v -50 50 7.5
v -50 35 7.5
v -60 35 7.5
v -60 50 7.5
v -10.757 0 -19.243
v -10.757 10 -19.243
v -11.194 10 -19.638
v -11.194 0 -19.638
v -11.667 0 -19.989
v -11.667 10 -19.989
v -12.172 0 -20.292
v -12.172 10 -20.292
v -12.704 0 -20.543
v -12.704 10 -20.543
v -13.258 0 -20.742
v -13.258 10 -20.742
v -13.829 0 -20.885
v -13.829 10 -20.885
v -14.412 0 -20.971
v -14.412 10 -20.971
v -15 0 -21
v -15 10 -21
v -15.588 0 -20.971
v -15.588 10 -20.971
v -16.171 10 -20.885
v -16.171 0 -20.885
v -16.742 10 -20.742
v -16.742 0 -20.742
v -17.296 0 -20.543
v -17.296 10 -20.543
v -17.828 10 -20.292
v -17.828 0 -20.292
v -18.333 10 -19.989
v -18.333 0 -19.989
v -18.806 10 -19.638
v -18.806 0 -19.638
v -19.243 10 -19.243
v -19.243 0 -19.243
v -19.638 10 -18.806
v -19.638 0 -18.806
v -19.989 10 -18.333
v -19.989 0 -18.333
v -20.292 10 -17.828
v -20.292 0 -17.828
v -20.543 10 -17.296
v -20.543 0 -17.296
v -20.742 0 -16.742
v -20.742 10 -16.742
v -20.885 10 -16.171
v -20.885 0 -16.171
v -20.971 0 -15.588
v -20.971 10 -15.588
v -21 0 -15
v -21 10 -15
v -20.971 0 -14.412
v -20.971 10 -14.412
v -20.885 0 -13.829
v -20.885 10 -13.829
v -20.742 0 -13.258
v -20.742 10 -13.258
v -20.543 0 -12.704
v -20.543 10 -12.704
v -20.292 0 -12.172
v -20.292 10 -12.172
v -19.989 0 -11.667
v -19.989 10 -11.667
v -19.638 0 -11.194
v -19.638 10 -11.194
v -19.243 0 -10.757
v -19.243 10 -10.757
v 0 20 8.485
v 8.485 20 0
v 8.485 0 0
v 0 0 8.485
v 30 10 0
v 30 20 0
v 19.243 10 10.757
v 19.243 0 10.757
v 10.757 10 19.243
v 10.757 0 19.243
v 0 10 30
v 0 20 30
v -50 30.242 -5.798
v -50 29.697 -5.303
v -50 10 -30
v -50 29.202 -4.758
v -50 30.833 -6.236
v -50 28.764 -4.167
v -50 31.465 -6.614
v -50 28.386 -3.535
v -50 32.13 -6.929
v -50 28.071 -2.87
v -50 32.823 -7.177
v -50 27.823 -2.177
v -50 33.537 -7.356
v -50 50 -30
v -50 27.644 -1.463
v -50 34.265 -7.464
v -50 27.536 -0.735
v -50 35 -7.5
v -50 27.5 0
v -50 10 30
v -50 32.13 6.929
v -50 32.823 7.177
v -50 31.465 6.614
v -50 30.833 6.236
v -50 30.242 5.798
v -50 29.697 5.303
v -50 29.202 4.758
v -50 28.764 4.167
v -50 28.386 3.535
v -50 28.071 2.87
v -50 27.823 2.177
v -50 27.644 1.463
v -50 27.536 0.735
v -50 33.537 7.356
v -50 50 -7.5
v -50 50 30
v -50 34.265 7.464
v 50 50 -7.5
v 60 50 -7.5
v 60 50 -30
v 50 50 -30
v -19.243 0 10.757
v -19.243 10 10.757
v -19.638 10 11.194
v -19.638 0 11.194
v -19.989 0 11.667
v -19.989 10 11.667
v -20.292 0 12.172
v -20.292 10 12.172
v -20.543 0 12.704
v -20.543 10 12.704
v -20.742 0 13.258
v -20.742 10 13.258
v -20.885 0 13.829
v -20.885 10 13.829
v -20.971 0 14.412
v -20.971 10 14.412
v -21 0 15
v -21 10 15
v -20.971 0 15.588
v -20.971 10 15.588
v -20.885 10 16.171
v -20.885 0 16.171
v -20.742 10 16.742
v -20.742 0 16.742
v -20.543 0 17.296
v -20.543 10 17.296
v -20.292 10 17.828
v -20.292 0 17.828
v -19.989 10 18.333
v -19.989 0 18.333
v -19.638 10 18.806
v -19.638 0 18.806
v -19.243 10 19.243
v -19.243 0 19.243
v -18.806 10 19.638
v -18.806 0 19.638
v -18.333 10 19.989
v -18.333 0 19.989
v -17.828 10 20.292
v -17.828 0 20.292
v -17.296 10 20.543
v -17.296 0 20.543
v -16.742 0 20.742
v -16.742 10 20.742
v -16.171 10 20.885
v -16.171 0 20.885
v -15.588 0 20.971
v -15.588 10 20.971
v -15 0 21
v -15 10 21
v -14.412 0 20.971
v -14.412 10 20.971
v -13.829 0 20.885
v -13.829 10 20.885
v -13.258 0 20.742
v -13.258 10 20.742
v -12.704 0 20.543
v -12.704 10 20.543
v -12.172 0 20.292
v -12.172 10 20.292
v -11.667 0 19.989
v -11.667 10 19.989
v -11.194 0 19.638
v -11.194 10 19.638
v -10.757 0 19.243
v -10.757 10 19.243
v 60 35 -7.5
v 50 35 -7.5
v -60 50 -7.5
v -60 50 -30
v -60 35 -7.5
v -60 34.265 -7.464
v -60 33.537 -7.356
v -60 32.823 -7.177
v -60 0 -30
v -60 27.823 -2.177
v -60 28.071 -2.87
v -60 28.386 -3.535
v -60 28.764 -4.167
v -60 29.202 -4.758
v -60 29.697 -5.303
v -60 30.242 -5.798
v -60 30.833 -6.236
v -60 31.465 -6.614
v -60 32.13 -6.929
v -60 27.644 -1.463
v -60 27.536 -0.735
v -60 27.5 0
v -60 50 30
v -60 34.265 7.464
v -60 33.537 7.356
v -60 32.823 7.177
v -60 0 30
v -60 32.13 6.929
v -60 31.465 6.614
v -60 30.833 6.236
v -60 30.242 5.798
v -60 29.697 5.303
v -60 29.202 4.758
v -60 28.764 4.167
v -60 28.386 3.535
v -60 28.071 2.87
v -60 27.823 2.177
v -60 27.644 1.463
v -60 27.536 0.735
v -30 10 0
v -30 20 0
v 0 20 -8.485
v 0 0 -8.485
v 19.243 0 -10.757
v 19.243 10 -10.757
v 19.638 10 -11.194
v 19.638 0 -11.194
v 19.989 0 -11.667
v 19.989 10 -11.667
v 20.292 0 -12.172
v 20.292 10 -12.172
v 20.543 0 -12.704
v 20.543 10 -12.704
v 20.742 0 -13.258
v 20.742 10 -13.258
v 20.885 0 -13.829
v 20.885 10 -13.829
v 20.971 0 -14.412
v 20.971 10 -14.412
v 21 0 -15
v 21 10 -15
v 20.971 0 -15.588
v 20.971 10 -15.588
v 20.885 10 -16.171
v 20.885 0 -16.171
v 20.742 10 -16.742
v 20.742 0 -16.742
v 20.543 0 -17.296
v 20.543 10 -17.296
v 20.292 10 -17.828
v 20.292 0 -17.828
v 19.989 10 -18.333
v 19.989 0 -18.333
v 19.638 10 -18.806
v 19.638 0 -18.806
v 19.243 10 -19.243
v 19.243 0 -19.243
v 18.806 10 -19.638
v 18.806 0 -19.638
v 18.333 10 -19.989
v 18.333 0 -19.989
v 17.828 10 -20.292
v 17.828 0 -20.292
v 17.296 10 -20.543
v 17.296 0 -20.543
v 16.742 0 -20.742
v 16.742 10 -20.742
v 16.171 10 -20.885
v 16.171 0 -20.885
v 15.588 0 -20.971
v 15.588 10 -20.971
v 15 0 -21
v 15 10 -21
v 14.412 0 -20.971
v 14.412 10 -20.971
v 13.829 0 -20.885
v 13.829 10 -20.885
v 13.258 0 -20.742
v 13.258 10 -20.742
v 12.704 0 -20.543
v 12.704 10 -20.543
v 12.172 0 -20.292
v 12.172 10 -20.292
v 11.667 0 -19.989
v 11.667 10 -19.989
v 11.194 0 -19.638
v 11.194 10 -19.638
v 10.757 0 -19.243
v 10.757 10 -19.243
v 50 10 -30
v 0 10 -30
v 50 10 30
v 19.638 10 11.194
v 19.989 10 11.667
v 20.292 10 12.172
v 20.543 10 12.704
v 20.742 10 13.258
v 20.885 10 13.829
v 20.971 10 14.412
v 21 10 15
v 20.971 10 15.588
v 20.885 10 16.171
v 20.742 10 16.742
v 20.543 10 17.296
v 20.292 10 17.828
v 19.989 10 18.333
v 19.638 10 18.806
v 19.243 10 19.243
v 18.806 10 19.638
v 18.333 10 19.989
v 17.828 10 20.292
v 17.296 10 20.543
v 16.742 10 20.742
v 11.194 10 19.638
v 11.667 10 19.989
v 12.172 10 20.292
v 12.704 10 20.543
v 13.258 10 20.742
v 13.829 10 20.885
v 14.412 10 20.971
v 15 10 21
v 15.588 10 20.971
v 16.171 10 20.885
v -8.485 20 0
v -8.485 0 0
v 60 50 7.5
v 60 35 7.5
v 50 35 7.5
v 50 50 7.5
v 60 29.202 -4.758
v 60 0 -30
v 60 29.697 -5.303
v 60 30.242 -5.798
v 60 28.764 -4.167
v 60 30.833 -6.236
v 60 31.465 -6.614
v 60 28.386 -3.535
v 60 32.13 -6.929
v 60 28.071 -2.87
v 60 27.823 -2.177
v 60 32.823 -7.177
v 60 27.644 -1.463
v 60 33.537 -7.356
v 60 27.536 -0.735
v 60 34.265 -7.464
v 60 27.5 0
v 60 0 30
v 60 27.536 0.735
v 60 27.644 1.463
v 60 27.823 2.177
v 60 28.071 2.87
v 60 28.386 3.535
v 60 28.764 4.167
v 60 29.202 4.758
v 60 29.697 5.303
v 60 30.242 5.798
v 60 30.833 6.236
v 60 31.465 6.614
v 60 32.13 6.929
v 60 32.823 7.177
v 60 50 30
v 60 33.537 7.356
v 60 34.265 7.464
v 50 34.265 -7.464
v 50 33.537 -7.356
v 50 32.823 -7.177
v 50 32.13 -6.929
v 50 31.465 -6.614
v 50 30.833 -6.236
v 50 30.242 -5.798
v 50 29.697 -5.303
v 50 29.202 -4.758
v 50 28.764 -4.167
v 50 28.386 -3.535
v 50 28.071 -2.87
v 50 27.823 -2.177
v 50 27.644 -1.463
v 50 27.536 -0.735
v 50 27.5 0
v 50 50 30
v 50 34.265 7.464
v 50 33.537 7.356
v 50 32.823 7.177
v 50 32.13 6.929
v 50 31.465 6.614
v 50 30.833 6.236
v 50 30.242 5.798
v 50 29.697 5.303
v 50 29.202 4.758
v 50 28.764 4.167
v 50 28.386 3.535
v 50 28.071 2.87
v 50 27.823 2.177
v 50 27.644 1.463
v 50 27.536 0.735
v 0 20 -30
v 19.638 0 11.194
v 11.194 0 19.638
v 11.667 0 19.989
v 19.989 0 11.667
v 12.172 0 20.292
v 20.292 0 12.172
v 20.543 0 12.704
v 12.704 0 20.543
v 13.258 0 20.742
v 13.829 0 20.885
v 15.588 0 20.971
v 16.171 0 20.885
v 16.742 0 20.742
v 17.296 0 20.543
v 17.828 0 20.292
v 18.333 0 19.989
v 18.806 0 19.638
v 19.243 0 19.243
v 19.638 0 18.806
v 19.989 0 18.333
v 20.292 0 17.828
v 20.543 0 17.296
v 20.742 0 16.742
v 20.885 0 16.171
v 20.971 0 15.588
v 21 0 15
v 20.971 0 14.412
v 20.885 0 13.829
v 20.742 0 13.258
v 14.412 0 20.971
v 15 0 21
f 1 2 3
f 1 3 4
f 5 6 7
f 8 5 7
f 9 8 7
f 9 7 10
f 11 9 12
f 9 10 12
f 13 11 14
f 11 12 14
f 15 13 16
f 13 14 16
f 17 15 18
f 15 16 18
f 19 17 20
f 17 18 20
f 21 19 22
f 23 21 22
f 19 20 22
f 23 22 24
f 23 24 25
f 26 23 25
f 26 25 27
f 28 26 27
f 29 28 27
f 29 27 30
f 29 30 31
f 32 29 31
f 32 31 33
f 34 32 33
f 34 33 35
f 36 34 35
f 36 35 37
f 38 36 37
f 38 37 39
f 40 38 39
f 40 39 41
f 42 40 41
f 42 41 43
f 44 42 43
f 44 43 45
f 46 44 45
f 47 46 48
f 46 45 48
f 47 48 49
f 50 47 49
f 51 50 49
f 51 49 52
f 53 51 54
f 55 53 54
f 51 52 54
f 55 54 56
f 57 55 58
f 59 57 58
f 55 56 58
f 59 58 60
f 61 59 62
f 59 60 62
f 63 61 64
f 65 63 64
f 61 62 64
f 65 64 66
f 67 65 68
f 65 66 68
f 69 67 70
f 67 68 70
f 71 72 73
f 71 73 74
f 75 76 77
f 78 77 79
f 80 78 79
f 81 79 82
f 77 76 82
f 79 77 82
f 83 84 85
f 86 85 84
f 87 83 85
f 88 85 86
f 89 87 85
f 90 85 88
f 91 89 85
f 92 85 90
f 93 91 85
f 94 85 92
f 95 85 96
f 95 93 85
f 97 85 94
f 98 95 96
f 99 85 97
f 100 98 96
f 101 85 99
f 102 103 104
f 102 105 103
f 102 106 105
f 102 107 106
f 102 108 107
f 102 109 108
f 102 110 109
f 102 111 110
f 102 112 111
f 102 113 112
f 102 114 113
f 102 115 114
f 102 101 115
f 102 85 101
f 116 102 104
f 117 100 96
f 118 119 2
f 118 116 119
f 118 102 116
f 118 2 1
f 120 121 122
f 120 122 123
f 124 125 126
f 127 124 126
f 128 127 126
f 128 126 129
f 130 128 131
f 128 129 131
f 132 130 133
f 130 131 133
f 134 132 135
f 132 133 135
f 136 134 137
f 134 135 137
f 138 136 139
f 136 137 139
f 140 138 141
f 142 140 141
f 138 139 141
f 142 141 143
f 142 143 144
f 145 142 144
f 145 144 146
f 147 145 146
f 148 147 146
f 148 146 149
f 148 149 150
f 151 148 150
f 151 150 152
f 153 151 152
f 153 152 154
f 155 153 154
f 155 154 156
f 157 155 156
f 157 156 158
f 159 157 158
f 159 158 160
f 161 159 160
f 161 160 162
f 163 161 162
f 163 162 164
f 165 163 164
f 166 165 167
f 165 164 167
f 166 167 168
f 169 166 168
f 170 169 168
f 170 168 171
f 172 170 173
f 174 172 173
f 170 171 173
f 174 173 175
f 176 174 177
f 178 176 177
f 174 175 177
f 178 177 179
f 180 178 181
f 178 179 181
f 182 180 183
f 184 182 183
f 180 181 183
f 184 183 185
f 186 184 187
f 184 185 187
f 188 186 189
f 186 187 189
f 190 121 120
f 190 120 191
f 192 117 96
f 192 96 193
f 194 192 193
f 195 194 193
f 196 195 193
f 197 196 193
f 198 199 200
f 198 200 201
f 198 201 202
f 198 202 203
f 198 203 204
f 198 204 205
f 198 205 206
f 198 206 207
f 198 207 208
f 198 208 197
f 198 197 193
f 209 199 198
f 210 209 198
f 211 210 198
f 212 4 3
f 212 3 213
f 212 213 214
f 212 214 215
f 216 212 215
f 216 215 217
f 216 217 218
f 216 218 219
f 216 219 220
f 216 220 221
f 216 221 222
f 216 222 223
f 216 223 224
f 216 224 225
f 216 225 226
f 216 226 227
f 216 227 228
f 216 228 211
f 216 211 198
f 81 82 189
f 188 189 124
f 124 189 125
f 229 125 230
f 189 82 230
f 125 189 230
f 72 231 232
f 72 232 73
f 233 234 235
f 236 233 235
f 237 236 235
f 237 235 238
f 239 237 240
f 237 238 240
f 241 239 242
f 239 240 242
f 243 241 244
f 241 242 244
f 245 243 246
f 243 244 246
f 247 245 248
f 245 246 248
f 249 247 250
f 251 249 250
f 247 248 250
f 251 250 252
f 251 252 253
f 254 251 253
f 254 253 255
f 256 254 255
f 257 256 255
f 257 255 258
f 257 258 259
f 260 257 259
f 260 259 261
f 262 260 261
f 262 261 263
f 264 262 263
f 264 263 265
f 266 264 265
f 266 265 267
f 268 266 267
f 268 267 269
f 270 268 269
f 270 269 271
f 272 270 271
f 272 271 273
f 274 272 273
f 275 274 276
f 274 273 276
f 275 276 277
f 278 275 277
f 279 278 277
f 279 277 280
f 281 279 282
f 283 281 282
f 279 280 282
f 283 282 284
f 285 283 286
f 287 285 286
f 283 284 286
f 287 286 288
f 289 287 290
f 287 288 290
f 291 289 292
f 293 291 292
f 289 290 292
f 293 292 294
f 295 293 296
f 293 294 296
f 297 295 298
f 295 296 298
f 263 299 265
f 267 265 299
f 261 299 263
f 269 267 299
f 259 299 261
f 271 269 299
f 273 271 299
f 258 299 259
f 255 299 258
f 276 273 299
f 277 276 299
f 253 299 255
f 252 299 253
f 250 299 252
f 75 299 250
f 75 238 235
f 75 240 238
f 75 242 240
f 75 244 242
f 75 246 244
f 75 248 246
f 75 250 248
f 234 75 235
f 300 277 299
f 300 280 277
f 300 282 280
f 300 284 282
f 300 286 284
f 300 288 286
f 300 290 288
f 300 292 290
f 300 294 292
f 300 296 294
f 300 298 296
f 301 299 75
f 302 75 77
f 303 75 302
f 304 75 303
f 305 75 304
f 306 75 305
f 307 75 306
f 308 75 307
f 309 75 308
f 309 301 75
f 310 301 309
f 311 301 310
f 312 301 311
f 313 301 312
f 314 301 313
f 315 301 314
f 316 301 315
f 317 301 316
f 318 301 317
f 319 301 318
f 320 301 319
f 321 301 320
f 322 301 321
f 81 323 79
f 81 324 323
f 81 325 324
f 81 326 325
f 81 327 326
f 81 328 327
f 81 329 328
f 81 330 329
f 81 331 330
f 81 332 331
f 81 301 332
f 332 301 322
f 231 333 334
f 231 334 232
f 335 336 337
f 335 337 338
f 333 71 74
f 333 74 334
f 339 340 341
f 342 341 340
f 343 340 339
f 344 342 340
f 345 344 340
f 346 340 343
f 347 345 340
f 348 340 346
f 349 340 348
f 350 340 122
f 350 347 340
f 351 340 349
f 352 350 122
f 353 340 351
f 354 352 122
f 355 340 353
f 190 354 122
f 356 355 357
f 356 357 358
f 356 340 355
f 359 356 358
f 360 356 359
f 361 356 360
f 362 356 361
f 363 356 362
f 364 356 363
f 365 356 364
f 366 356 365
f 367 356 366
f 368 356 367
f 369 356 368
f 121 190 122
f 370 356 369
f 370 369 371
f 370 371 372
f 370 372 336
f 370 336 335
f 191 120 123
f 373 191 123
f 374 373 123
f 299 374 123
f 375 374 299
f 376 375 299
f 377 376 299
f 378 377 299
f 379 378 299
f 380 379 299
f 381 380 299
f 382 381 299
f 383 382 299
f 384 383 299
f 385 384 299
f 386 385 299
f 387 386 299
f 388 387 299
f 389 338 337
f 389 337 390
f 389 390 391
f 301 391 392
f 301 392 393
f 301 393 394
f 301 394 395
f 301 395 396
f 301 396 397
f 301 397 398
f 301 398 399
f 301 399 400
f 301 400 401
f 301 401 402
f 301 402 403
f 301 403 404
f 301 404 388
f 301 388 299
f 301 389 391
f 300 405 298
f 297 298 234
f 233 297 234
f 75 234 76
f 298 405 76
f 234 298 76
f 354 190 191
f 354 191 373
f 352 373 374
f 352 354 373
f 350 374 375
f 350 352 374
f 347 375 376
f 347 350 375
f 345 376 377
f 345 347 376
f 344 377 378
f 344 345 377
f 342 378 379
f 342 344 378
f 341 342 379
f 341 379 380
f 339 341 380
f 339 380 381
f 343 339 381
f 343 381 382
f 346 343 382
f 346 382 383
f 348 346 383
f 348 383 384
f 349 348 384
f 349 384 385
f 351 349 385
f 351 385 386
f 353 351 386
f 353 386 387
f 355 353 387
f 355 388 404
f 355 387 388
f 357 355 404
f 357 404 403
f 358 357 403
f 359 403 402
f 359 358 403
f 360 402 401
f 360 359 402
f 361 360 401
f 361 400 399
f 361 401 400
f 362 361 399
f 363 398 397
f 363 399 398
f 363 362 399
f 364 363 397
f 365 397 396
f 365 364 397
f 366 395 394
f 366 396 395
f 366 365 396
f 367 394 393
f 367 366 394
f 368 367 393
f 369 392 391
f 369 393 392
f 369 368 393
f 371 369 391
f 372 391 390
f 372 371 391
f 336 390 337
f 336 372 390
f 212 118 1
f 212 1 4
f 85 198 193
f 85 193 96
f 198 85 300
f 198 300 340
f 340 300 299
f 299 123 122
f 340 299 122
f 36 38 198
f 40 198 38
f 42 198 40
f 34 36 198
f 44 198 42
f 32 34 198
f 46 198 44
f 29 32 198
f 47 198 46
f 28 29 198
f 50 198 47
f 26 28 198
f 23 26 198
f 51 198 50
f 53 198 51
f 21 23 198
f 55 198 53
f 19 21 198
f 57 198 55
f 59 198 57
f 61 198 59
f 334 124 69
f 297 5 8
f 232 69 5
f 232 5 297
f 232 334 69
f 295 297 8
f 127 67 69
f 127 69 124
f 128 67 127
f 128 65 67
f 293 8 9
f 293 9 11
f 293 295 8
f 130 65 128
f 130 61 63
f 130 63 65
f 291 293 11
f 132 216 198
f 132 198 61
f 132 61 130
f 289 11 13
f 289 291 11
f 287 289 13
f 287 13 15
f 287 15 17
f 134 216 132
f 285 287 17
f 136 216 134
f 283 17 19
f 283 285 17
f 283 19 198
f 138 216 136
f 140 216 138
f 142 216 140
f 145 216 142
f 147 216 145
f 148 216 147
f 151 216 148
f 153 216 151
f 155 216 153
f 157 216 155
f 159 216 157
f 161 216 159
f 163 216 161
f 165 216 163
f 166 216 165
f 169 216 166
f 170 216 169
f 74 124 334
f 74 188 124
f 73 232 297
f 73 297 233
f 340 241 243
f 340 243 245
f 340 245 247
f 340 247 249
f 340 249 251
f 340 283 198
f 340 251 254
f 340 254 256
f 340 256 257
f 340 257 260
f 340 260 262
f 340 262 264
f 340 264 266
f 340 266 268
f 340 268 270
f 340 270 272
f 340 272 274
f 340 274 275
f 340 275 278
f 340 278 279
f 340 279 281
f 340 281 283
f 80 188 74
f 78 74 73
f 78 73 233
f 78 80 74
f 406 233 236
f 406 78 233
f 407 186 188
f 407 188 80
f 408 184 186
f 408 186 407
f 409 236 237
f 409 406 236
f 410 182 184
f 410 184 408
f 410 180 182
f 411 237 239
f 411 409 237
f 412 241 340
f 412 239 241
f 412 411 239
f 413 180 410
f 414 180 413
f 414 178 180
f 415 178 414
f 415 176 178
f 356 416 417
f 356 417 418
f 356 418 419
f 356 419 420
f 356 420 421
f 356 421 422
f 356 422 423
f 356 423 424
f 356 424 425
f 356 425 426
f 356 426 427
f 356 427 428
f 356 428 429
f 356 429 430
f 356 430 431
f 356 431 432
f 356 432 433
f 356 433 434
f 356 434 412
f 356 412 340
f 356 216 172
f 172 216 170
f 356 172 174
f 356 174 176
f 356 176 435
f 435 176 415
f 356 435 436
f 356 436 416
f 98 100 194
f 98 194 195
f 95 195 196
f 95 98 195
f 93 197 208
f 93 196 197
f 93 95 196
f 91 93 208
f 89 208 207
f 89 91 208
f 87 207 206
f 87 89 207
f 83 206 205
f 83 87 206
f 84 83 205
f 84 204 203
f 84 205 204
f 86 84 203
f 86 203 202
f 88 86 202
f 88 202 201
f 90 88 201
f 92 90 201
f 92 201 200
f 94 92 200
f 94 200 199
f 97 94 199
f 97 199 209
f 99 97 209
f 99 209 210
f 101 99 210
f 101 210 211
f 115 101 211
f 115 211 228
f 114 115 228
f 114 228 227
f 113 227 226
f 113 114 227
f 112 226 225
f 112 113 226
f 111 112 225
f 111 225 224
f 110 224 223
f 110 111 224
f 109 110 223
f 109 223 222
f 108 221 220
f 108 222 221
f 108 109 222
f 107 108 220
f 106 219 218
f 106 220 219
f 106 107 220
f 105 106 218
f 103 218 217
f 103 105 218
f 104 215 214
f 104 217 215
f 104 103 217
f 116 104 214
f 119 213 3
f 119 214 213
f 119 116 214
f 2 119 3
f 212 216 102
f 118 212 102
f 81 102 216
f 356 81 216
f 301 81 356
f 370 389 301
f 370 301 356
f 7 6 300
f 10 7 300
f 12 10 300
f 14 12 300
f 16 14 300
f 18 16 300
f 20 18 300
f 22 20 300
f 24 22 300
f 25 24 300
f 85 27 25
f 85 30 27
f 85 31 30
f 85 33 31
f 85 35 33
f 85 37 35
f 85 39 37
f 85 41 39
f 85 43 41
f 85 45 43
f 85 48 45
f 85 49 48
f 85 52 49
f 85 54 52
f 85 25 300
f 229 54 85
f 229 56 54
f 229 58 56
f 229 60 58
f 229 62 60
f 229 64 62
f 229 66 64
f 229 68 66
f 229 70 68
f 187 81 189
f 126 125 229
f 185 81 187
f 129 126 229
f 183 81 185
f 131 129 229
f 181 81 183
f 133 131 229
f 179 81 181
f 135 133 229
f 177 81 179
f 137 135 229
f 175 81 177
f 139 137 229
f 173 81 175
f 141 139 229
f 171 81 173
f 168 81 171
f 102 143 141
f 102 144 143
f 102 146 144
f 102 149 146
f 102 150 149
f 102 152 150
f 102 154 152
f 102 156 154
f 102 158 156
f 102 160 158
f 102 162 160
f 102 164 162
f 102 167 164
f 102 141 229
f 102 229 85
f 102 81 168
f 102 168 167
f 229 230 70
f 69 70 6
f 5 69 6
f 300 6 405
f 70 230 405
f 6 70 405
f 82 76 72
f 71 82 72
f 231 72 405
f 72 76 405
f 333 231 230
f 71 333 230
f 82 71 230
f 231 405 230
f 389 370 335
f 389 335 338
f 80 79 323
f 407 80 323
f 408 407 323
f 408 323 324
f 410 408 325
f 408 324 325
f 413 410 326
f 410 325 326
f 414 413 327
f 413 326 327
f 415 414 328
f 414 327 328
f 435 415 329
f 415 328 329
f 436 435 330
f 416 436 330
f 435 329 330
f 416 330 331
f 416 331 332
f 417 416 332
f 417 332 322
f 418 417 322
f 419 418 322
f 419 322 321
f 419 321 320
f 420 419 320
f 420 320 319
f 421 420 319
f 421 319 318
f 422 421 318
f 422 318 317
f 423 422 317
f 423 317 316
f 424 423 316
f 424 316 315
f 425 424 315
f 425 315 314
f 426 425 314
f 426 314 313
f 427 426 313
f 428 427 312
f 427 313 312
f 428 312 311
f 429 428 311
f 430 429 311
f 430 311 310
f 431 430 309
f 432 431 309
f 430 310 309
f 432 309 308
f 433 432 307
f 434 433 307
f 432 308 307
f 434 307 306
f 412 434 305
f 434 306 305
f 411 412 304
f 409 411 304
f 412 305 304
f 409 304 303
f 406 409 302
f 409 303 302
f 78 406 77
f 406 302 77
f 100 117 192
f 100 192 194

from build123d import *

# Parameters (mm, degrees)
BOSS_EXTRUDE1_DEPTH = 30
CUT_EXTRUDE1_DEPTH  = 121
BOSS_EXTRUDE2_DEPTH = 10
CUT_EXTRUDE2_DEPTH  = 21
CUT_EXTRUDE3_DEPTH  = 21


with BuildPart() as part:
    # Sketch1 → Boss-Extrude1 (new body, symmetric)
    with BuildSketch(Plane.XY):
        Polygon((-60, 0), (60, 0), (60, 50), (50, 50), (50, 10), (-50, 10), (-50, 50), (-60, 50), align=None)
    extrude(amount=BOSS_EXTRUDE1_DEPTH, both=True)

    # Sketch2 → Cut-Extrude1 (cut, through all)
    with BuildSketch(Plane(origin=(60, 0, 0), x_dir=(0, 0, -1), z_dir=(1, 0, 0))):
        with BuildLine():
            Line((-7.5, 35), (-7.5, 50))
            Line((-7.5, 50), (7.5, 50))
            Line((7.5, 50), (7.5, 35))
            ThreePointArc((7.5, 35), (0, 27.5), (-7.5, 35))
        make_face()
    extrude(amount=-CUT_EXTRUDE1_DEPTH, mode=Mode.SUBTRACT)

    # Sketch3 → Boss-Extrude2 (add)
    with BuildSketch(Plane(origin=(0, 10, 0), x_dir=(1, 0, 0), z_dir=(0, 1, 0))):
        Polygon((0, 30), (30, 0), (0, -30), (-30, 0), align=None)
    extrude(amount=BOSS_EXTRUDE2_DEPTH)

    # Sketch4 → Cut-Extrude2 (cut, through all)
    with BuildSketch(Plane(origin=(0, 20, 0), x_dir=(1, 0, 0), z_dir=(0, 1, 0))):
        Polygon((0, 8.485281374), (8.485281374, 0), (0, -8.485281374), (-8.485281374, 0), align=None)
    extrude(amount=-CUT_EXTRUDE2_DEPTH, mode=Mode.SUBTRACT)

    # Sketch5 → Cut-Extrude3 (cut, through all)
    with BuildSketch(Plane(origin=(0, 20, 0), x_dir=(1, 0, 0), z_dir=(0, 1, 0))):
        with BuildLine():
            Line((10.757359313, 19.242640687), (19.242640687, 10.757359313))
            ThreePointArc((19.242640687, 10.757359313), (19.242640687, 19.242640687), (10.757359313, 19.242640687))
        make_face()
        with BuildLine():
            Line((19.242640687, -10.757359313), (10.757359313, -19.242640687))
            ThreePointArc((10.757359313, -19.242640687), (19.242640687, -19.242640687), (19.242640687, -10.757359313))
        make_face()
        with BuildLine():
            Line((-10.757359313, -19.242640687), (-19.242640687, -10.757359313))
            ThreePointArc((-19.242640687, -10.757359313), (-19.242640687, -19.242640687), (-10.757359313, -19.242640687))
        make_face()
        with BuildLine():
            Line((-19.242640687, 10.757359313), (-10.757359313, 19.242640687))
            ThreePointArc((-10.757359313, 19.242640687), (-19.242640687, 19.242640687), (-19.242640687, 10.757359313))
        make_face()
    extrude(amount=-CUT_EXTRUDE3_DEPTH, mode=Mode.SUBTRACT)


solid = part.part
